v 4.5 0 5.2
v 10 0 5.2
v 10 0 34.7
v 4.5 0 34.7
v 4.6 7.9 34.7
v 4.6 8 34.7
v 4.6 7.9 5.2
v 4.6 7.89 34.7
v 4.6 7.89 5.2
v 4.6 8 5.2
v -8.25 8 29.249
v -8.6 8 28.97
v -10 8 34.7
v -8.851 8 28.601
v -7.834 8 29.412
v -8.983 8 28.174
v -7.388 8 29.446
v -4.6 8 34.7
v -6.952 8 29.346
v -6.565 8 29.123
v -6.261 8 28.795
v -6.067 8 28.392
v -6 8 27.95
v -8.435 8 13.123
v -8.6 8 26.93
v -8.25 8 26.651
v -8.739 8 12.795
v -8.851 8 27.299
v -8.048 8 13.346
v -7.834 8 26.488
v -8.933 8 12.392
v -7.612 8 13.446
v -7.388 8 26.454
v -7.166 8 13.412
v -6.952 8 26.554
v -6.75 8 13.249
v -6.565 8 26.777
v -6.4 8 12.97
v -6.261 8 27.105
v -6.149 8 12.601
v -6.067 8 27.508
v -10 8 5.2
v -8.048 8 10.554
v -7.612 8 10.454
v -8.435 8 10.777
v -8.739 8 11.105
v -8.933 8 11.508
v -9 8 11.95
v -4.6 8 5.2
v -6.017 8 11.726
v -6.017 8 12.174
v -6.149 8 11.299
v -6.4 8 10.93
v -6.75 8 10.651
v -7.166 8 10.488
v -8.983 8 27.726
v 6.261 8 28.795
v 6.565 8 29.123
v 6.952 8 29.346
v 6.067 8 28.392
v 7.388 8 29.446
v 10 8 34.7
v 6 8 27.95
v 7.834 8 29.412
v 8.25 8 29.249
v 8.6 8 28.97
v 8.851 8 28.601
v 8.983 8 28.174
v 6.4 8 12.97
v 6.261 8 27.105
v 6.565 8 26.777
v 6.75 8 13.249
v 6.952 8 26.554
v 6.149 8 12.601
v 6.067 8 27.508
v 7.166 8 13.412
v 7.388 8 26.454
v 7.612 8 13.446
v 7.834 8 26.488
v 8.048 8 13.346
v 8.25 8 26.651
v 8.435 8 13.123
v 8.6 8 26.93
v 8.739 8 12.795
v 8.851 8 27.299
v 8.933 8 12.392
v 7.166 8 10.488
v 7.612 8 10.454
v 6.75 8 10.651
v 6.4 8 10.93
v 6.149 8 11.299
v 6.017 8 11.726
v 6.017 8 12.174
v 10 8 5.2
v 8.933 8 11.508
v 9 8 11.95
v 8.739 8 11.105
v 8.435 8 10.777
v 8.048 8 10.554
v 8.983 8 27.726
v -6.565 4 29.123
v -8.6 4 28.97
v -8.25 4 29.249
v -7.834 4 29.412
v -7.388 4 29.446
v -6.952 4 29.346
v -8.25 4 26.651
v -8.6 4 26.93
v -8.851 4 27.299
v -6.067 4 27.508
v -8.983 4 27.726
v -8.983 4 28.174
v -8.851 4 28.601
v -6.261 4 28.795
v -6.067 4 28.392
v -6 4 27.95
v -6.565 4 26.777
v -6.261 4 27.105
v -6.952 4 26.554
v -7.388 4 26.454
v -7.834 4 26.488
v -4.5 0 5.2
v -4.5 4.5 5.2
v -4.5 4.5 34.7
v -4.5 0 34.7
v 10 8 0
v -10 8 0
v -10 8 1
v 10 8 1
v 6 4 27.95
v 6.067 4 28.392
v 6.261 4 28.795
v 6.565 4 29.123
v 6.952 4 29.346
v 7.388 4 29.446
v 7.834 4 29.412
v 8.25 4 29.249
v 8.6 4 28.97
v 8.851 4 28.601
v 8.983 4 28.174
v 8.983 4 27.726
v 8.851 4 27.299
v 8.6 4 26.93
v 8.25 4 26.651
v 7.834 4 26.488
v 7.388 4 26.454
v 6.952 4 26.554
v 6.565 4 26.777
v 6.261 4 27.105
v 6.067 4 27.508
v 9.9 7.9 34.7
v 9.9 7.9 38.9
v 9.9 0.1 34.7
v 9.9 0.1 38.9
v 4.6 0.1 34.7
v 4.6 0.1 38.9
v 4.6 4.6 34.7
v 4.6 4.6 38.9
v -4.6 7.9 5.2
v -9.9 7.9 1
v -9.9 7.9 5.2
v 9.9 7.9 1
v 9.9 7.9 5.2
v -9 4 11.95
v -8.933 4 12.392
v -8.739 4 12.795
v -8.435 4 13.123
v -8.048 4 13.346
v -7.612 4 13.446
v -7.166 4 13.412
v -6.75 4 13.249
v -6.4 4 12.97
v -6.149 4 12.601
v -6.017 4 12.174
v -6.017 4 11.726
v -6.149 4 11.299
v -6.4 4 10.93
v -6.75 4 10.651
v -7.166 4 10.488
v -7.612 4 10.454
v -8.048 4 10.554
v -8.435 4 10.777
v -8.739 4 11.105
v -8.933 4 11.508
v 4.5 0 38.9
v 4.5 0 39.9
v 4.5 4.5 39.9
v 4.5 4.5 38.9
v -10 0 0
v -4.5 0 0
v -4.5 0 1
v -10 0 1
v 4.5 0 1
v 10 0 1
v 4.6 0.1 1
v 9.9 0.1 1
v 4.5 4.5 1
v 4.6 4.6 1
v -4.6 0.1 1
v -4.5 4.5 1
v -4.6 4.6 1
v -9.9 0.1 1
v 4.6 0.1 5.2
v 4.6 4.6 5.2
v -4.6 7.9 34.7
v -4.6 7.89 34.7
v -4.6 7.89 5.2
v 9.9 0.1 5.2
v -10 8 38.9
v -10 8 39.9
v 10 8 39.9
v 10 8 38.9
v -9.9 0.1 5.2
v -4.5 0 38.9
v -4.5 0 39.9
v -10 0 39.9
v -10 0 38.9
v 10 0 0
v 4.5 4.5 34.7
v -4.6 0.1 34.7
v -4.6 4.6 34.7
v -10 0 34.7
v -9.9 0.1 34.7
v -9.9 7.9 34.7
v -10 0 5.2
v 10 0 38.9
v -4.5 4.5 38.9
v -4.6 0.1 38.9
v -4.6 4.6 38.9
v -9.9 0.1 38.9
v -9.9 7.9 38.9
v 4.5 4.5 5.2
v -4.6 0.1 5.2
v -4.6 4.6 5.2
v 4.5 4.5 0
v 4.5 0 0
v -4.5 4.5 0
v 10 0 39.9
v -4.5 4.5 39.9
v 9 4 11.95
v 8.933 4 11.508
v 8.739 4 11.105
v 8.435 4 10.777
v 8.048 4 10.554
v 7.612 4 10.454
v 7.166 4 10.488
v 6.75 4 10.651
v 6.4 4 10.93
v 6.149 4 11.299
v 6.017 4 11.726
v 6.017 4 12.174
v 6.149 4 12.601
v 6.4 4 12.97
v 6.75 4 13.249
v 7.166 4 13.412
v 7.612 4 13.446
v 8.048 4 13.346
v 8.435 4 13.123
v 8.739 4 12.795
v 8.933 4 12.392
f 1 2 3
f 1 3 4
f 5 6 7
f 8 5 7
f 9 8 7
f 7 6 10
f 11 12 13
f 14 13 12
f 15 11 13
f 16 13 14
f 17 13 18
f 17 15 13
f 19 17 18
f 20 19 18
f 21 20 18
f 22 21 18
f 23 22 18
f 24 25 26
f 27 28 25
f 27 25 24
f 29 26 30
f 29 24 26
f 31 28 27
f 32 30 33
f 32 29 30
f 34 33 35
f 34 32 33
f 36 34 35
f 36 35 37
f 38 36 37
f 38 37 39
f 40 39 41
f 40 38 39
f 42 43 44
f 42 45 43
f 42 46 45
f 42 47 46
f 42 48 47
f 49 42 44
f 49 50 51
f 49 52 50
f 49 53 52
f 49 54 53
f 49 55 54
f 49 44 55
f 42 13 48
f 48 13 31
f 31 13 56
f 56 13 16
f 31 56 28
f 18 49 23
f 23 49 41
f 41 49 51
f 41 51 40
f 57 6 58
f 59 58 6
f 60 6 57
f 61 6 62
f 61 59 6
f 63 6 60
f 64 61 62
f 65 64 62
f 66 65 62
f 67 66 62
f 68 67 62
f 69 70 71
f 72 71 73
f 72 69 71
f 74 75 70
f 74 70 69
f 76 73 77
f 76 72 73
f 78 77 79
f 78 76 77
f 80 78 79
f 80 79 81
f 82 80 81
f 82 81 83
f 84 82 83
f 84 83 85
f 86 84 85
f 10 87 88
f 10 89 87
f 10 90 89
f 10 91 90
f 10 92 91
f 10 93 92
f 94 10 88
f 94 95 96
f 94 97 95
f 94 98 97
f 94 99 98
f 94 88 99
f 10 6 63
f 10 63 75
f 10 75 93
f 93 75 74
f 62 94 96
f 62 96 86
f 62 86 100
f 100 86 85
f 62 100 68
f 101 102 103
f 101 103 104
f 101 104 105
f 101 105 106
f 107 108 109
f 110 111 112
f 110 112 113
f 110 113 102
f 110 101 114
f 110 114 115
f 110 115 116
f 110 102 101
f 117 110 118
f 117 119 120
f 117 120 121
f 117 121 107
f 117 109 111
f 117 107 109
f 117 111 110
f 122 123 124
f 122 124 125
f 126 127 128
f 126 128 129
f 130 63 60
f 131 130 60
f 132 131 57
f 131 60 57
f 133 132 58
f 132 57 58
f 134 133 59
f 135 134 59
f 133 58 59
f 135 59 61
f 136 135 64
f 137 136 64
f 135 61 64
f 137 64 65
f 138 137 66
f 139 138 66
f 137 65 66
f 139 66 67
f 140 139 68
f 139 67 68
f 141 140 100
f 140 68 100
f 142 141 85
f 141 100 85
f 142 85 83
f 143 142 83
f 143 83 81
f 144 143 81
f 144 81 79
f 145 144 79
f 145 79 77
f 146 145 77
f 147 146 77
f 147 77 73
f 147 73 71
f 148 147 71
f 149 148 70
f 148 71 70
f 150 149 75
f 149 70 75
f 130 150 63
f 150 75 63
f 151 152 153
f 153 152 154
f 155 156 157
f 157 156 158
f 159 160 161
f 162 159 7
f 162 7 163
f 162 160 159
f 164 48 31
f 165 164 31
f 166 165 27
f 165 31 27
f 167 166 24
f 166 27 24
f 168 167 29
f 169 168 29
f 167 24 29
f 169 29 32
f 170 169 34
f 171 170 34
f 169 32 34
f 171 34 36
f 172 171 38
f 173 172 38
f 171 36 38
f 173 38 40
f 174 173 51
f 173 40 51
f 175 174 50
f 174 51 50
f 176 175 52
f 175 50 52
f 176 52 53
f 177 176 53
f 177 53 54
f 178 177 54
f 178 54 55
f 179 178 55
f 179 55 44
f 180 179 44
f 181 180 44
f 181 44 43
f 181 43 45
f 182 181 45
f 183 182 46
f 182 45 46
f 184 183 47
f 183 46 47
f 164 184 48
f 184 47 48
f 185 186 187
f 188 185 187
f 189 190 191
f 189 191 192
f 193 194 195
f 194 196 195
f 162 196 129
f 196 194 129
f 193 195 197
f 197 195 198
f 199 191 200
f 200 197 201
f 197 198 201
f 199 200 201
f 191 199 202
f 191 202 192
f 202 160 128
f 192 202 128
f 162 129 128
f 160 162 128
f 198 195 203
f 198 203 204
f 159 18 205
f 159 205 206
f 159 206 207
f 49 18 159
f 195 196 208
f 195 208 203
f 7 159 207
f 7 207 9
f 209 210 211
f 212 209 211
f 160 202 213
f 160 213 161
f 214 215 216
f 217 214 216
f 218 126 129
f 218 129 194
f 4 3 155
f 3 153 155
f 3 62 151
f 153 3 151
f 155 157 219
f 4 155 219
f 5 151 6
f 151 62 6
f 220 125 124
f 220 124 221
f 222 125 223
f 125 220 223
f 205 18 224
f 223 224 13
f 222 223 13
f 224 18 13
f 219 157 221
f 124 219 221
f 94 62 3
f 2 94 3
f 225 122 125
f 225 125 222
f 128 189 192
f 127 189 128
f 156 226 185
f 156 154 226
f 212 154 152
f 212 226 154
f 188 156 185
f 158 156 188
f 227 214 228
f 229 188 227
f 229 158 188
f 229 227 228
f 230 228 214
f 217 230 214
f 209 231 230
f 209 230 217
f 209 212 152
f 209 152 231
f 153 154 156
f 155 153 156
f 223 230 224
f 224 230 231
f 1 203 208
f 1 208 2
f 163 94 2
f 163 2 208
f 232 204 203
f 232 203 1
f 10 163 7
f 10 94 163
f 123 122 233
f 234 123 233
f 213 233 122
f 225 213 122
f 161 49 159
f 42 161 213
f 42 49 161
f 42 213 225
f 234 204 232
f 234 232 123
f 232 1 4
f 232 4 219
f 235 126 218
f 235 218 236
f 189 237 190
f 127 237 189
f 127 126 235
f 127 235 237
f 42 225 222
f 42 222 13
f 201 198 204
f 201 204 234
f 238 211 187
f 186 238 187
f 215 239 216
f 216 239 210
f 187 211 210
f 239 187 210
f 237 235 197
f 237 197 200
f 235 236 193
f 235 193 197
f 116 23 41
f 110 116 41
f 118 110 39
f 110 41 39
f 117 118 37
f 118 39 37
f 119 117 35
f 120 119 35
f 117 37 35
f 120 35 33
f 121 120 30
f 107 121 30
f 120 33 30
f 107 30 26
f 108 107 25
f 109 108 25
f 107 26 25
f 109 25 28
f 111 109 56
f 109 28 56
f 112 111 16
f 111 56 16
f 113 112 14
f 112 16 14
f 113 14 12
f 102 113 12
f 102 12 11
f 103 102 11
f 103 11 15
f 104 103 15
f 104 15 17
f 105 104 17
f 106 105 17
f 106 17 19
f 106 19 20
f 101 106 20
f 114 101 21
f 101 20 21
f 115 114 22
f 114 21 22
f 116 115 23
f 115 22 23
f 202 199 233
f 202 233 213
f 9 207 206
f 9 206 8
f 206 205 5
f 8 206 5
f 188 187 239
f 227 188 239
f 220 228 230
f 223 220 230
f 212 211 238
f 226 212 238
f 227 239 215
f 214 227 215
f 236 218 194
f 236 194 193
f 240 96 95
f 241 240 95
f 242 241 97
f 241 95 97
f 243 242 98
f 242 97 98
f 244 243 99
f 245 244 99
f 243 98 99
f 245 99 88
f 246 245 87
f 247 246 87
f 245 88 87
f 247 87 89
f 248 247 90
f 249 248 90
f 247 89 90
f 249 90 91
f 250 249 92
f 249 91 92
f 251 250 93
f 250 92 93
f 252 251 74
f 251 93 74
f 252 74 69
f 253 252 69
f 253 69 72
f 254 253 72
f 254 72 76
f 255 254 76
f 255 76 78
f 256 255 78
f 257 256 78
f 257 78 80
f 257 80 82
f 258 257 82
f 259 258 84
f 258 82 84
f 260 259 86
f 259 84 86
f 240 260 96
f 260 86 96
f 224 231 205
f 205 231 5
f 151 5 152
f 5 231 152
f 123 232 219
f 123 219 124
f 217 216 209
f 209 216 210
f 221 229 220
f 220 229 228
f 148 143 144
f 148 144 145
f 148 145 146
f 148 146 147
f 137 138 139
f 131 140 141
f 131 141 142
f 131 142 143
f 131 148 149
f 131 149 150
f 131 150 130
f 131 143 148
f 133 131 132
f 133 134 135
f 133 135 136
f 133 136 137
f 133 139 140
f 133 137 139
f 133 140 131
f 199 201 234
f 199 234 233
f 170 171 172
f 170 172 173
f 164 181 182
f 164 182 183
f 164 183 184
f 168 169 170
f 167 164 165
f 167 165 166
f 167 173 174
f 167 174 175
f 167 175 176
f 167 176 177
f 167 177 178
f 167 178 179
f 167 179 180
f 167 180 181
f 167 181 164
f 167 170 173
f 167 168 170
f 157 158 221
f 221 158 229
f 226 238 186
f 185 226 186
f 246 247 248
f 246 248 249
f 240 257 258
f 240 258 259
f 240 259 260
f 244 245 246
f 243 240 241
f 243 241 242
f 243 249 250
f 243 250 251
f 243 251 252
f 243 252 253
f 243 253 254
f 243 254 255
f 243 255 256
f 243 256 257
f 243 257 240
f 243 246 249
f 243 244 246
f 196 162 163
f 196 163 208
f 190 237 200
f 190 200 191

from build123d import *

# Parameters (mm, degrees)
BOSS_EXTRUDE1_DEPTH = 39.9
SKETCH2_R           = 1.5
CUT_EXTRUDE1_DEPTH  = 4
CUT_EXTRUDE2_DEPTH  = 5.2
CUT_EXTRUDE3_START  = -39.9
CUT_EXTRUDE3_DEPTH  = 5.2
BOSS_EXTRUDE2_DEPTH = 1
BOSS_EXTRUDE3_START = -39.9
BOSS_EXTRUDE3_DEPTH = 1
SKETCH5_W           = 9.2
SKETCH5_H           = 29.5
CUT_EXTRUDE4_DEPTH  = 0.11


with BuildPart() as part:
    # Sketch1 → Boss-Extrude1 (new body)
    with BuildSketch(Plane.XY):
        Polygon((4.5, 4.5), (-4.5, 4.5), (-4.5, 0), (-10, 0), (-10, 8), (10, 8), (10, 0), (4.5, 0), align=None)
    extrude(amount=BOSS_EXTRUDE1_DEPTH)

    # Sketch2 → Cut-Extrude1 (cut)
    with BuildSketch(Plane(origin=(0, 8, 0), x_dir=(1, 0, 0), z_dir=(0, 1, 0))):
        with Locations(Location((-7.5, -11.95, 0), (0, 0, 180))):
            Circle(SKETCH2_R)
        with Locations((7.5, -11.95)):
            Circle(SKETCH2_R)
        with Locations(Location((7.5, -27.95, 0), (0, 0, 180))):
            Circle(SKETCH2_R)
        with Locations((-7.5, -27.95)):
            Circle(SKETCH2_R)
    extrude(amount=-CUT_EXTRUDE1_DEPTH, mode=Mode.SUBTRACT)

    # Sketch3 → Cut-Extrude2 (cut)
    with BuildSketch(Plane(origin=(0, 0, 0), x_dir=(-1, 0, 0), z_dir=(0, 0, -1))):
        Polygon((4.5, 0), (10, 0), (10, 8), (-10, 8), (-10, 0), (-4.5, 0), (-4.5, 4.5), (4.5, 4.5), align=None)
        Polygon((4.6, 0.1), (9.9, 0.1), (9.9, 7.9), (-9.9, 7.9), (-9.9, 0.1), (-4.6, 0.1), (-4.6, 4.6), (4.6, 4.6), align=None, mode=Mode.SUBTRACT)
    extrude(amount=-CUT_EXTRUDE2_DEPTH, mode=Mode.SUBTRACT)

    # Sketch3<3> → Cut-Extrude3 (cut)
    with BuildSketch(Plane(origin=(0, 0, 0), x_dir=(-1, 0, 0), z_dir=(0, 0, -1)).offset(CUT_EXTRUDE3_START)):
        Polygon((10, 0), (10, 8), (-10, 8), (-10, 0), (-4.5, 0), (-4.5, 4.5), (4.5, 4.5), (4.5, 0), align=None)
        Polygon((9.9, 0.1), (9.9, 7.9), (-9.9, 7.9), (-9.9, 0.1), (-4.6, 0.1), (-4.6, 4.6), (4.6, 4.6), (4.6, 0.1), align=None, mode=Mode.SUBTRACT)
    extrude(amount=CUT_EXTRUDE3_DEPTH, mode=Mode.SUBTRACT)

    # Sketch4 → Boss-Extrude2 (add)
    with BuildSketch(Plane(origin=(0, 0, 0), x_dir=(-1, 0, 0), z_dir=(0, 0, -1))):
        Polygon((4.5, 4.5), (4.5, 0), (10, 0), (10, 8), (-10, 8), (-10, 0), (-4.5, 0), (-4.5, 4.5), align=None)
    extrude(amount=-BOSS_EXTRUDE2_DEPTH)

    # Sketch4<2> → Boss-Extrude3 (add)
    with BuildSketch(Plane(origin=(0, 0, 0), x_dir=(-1, 0, 0), z_dir=(0, 0, -1)).offset(BOSS_EXTRUDE3_START)):
        Polygon((4.5, 4.5), (4.5, 0), (10, 0), (10, 8), (-10, 8), (-10, 0), (-4.5, 0), (-4.5, 4.5), align=None)
    extrude(amount=BOSS_EXTRUDE3_DEPTH)

    # Sketch5 → Cut-Extrude4 (cut)
    with BuildSketch(Plane(origin=(0, 8, 0), x_dir=(1, 0, 0), z_dir=(0, 1, 0))):
        with Locations((0, -19.95)):
            Rectangle(SKETCH5_W, SKETCH5_H)
    extrude(amount=-CUT_EXTRUDE4_DEPTH, mode=Mode.SUBTRACT)


solid = part.part
